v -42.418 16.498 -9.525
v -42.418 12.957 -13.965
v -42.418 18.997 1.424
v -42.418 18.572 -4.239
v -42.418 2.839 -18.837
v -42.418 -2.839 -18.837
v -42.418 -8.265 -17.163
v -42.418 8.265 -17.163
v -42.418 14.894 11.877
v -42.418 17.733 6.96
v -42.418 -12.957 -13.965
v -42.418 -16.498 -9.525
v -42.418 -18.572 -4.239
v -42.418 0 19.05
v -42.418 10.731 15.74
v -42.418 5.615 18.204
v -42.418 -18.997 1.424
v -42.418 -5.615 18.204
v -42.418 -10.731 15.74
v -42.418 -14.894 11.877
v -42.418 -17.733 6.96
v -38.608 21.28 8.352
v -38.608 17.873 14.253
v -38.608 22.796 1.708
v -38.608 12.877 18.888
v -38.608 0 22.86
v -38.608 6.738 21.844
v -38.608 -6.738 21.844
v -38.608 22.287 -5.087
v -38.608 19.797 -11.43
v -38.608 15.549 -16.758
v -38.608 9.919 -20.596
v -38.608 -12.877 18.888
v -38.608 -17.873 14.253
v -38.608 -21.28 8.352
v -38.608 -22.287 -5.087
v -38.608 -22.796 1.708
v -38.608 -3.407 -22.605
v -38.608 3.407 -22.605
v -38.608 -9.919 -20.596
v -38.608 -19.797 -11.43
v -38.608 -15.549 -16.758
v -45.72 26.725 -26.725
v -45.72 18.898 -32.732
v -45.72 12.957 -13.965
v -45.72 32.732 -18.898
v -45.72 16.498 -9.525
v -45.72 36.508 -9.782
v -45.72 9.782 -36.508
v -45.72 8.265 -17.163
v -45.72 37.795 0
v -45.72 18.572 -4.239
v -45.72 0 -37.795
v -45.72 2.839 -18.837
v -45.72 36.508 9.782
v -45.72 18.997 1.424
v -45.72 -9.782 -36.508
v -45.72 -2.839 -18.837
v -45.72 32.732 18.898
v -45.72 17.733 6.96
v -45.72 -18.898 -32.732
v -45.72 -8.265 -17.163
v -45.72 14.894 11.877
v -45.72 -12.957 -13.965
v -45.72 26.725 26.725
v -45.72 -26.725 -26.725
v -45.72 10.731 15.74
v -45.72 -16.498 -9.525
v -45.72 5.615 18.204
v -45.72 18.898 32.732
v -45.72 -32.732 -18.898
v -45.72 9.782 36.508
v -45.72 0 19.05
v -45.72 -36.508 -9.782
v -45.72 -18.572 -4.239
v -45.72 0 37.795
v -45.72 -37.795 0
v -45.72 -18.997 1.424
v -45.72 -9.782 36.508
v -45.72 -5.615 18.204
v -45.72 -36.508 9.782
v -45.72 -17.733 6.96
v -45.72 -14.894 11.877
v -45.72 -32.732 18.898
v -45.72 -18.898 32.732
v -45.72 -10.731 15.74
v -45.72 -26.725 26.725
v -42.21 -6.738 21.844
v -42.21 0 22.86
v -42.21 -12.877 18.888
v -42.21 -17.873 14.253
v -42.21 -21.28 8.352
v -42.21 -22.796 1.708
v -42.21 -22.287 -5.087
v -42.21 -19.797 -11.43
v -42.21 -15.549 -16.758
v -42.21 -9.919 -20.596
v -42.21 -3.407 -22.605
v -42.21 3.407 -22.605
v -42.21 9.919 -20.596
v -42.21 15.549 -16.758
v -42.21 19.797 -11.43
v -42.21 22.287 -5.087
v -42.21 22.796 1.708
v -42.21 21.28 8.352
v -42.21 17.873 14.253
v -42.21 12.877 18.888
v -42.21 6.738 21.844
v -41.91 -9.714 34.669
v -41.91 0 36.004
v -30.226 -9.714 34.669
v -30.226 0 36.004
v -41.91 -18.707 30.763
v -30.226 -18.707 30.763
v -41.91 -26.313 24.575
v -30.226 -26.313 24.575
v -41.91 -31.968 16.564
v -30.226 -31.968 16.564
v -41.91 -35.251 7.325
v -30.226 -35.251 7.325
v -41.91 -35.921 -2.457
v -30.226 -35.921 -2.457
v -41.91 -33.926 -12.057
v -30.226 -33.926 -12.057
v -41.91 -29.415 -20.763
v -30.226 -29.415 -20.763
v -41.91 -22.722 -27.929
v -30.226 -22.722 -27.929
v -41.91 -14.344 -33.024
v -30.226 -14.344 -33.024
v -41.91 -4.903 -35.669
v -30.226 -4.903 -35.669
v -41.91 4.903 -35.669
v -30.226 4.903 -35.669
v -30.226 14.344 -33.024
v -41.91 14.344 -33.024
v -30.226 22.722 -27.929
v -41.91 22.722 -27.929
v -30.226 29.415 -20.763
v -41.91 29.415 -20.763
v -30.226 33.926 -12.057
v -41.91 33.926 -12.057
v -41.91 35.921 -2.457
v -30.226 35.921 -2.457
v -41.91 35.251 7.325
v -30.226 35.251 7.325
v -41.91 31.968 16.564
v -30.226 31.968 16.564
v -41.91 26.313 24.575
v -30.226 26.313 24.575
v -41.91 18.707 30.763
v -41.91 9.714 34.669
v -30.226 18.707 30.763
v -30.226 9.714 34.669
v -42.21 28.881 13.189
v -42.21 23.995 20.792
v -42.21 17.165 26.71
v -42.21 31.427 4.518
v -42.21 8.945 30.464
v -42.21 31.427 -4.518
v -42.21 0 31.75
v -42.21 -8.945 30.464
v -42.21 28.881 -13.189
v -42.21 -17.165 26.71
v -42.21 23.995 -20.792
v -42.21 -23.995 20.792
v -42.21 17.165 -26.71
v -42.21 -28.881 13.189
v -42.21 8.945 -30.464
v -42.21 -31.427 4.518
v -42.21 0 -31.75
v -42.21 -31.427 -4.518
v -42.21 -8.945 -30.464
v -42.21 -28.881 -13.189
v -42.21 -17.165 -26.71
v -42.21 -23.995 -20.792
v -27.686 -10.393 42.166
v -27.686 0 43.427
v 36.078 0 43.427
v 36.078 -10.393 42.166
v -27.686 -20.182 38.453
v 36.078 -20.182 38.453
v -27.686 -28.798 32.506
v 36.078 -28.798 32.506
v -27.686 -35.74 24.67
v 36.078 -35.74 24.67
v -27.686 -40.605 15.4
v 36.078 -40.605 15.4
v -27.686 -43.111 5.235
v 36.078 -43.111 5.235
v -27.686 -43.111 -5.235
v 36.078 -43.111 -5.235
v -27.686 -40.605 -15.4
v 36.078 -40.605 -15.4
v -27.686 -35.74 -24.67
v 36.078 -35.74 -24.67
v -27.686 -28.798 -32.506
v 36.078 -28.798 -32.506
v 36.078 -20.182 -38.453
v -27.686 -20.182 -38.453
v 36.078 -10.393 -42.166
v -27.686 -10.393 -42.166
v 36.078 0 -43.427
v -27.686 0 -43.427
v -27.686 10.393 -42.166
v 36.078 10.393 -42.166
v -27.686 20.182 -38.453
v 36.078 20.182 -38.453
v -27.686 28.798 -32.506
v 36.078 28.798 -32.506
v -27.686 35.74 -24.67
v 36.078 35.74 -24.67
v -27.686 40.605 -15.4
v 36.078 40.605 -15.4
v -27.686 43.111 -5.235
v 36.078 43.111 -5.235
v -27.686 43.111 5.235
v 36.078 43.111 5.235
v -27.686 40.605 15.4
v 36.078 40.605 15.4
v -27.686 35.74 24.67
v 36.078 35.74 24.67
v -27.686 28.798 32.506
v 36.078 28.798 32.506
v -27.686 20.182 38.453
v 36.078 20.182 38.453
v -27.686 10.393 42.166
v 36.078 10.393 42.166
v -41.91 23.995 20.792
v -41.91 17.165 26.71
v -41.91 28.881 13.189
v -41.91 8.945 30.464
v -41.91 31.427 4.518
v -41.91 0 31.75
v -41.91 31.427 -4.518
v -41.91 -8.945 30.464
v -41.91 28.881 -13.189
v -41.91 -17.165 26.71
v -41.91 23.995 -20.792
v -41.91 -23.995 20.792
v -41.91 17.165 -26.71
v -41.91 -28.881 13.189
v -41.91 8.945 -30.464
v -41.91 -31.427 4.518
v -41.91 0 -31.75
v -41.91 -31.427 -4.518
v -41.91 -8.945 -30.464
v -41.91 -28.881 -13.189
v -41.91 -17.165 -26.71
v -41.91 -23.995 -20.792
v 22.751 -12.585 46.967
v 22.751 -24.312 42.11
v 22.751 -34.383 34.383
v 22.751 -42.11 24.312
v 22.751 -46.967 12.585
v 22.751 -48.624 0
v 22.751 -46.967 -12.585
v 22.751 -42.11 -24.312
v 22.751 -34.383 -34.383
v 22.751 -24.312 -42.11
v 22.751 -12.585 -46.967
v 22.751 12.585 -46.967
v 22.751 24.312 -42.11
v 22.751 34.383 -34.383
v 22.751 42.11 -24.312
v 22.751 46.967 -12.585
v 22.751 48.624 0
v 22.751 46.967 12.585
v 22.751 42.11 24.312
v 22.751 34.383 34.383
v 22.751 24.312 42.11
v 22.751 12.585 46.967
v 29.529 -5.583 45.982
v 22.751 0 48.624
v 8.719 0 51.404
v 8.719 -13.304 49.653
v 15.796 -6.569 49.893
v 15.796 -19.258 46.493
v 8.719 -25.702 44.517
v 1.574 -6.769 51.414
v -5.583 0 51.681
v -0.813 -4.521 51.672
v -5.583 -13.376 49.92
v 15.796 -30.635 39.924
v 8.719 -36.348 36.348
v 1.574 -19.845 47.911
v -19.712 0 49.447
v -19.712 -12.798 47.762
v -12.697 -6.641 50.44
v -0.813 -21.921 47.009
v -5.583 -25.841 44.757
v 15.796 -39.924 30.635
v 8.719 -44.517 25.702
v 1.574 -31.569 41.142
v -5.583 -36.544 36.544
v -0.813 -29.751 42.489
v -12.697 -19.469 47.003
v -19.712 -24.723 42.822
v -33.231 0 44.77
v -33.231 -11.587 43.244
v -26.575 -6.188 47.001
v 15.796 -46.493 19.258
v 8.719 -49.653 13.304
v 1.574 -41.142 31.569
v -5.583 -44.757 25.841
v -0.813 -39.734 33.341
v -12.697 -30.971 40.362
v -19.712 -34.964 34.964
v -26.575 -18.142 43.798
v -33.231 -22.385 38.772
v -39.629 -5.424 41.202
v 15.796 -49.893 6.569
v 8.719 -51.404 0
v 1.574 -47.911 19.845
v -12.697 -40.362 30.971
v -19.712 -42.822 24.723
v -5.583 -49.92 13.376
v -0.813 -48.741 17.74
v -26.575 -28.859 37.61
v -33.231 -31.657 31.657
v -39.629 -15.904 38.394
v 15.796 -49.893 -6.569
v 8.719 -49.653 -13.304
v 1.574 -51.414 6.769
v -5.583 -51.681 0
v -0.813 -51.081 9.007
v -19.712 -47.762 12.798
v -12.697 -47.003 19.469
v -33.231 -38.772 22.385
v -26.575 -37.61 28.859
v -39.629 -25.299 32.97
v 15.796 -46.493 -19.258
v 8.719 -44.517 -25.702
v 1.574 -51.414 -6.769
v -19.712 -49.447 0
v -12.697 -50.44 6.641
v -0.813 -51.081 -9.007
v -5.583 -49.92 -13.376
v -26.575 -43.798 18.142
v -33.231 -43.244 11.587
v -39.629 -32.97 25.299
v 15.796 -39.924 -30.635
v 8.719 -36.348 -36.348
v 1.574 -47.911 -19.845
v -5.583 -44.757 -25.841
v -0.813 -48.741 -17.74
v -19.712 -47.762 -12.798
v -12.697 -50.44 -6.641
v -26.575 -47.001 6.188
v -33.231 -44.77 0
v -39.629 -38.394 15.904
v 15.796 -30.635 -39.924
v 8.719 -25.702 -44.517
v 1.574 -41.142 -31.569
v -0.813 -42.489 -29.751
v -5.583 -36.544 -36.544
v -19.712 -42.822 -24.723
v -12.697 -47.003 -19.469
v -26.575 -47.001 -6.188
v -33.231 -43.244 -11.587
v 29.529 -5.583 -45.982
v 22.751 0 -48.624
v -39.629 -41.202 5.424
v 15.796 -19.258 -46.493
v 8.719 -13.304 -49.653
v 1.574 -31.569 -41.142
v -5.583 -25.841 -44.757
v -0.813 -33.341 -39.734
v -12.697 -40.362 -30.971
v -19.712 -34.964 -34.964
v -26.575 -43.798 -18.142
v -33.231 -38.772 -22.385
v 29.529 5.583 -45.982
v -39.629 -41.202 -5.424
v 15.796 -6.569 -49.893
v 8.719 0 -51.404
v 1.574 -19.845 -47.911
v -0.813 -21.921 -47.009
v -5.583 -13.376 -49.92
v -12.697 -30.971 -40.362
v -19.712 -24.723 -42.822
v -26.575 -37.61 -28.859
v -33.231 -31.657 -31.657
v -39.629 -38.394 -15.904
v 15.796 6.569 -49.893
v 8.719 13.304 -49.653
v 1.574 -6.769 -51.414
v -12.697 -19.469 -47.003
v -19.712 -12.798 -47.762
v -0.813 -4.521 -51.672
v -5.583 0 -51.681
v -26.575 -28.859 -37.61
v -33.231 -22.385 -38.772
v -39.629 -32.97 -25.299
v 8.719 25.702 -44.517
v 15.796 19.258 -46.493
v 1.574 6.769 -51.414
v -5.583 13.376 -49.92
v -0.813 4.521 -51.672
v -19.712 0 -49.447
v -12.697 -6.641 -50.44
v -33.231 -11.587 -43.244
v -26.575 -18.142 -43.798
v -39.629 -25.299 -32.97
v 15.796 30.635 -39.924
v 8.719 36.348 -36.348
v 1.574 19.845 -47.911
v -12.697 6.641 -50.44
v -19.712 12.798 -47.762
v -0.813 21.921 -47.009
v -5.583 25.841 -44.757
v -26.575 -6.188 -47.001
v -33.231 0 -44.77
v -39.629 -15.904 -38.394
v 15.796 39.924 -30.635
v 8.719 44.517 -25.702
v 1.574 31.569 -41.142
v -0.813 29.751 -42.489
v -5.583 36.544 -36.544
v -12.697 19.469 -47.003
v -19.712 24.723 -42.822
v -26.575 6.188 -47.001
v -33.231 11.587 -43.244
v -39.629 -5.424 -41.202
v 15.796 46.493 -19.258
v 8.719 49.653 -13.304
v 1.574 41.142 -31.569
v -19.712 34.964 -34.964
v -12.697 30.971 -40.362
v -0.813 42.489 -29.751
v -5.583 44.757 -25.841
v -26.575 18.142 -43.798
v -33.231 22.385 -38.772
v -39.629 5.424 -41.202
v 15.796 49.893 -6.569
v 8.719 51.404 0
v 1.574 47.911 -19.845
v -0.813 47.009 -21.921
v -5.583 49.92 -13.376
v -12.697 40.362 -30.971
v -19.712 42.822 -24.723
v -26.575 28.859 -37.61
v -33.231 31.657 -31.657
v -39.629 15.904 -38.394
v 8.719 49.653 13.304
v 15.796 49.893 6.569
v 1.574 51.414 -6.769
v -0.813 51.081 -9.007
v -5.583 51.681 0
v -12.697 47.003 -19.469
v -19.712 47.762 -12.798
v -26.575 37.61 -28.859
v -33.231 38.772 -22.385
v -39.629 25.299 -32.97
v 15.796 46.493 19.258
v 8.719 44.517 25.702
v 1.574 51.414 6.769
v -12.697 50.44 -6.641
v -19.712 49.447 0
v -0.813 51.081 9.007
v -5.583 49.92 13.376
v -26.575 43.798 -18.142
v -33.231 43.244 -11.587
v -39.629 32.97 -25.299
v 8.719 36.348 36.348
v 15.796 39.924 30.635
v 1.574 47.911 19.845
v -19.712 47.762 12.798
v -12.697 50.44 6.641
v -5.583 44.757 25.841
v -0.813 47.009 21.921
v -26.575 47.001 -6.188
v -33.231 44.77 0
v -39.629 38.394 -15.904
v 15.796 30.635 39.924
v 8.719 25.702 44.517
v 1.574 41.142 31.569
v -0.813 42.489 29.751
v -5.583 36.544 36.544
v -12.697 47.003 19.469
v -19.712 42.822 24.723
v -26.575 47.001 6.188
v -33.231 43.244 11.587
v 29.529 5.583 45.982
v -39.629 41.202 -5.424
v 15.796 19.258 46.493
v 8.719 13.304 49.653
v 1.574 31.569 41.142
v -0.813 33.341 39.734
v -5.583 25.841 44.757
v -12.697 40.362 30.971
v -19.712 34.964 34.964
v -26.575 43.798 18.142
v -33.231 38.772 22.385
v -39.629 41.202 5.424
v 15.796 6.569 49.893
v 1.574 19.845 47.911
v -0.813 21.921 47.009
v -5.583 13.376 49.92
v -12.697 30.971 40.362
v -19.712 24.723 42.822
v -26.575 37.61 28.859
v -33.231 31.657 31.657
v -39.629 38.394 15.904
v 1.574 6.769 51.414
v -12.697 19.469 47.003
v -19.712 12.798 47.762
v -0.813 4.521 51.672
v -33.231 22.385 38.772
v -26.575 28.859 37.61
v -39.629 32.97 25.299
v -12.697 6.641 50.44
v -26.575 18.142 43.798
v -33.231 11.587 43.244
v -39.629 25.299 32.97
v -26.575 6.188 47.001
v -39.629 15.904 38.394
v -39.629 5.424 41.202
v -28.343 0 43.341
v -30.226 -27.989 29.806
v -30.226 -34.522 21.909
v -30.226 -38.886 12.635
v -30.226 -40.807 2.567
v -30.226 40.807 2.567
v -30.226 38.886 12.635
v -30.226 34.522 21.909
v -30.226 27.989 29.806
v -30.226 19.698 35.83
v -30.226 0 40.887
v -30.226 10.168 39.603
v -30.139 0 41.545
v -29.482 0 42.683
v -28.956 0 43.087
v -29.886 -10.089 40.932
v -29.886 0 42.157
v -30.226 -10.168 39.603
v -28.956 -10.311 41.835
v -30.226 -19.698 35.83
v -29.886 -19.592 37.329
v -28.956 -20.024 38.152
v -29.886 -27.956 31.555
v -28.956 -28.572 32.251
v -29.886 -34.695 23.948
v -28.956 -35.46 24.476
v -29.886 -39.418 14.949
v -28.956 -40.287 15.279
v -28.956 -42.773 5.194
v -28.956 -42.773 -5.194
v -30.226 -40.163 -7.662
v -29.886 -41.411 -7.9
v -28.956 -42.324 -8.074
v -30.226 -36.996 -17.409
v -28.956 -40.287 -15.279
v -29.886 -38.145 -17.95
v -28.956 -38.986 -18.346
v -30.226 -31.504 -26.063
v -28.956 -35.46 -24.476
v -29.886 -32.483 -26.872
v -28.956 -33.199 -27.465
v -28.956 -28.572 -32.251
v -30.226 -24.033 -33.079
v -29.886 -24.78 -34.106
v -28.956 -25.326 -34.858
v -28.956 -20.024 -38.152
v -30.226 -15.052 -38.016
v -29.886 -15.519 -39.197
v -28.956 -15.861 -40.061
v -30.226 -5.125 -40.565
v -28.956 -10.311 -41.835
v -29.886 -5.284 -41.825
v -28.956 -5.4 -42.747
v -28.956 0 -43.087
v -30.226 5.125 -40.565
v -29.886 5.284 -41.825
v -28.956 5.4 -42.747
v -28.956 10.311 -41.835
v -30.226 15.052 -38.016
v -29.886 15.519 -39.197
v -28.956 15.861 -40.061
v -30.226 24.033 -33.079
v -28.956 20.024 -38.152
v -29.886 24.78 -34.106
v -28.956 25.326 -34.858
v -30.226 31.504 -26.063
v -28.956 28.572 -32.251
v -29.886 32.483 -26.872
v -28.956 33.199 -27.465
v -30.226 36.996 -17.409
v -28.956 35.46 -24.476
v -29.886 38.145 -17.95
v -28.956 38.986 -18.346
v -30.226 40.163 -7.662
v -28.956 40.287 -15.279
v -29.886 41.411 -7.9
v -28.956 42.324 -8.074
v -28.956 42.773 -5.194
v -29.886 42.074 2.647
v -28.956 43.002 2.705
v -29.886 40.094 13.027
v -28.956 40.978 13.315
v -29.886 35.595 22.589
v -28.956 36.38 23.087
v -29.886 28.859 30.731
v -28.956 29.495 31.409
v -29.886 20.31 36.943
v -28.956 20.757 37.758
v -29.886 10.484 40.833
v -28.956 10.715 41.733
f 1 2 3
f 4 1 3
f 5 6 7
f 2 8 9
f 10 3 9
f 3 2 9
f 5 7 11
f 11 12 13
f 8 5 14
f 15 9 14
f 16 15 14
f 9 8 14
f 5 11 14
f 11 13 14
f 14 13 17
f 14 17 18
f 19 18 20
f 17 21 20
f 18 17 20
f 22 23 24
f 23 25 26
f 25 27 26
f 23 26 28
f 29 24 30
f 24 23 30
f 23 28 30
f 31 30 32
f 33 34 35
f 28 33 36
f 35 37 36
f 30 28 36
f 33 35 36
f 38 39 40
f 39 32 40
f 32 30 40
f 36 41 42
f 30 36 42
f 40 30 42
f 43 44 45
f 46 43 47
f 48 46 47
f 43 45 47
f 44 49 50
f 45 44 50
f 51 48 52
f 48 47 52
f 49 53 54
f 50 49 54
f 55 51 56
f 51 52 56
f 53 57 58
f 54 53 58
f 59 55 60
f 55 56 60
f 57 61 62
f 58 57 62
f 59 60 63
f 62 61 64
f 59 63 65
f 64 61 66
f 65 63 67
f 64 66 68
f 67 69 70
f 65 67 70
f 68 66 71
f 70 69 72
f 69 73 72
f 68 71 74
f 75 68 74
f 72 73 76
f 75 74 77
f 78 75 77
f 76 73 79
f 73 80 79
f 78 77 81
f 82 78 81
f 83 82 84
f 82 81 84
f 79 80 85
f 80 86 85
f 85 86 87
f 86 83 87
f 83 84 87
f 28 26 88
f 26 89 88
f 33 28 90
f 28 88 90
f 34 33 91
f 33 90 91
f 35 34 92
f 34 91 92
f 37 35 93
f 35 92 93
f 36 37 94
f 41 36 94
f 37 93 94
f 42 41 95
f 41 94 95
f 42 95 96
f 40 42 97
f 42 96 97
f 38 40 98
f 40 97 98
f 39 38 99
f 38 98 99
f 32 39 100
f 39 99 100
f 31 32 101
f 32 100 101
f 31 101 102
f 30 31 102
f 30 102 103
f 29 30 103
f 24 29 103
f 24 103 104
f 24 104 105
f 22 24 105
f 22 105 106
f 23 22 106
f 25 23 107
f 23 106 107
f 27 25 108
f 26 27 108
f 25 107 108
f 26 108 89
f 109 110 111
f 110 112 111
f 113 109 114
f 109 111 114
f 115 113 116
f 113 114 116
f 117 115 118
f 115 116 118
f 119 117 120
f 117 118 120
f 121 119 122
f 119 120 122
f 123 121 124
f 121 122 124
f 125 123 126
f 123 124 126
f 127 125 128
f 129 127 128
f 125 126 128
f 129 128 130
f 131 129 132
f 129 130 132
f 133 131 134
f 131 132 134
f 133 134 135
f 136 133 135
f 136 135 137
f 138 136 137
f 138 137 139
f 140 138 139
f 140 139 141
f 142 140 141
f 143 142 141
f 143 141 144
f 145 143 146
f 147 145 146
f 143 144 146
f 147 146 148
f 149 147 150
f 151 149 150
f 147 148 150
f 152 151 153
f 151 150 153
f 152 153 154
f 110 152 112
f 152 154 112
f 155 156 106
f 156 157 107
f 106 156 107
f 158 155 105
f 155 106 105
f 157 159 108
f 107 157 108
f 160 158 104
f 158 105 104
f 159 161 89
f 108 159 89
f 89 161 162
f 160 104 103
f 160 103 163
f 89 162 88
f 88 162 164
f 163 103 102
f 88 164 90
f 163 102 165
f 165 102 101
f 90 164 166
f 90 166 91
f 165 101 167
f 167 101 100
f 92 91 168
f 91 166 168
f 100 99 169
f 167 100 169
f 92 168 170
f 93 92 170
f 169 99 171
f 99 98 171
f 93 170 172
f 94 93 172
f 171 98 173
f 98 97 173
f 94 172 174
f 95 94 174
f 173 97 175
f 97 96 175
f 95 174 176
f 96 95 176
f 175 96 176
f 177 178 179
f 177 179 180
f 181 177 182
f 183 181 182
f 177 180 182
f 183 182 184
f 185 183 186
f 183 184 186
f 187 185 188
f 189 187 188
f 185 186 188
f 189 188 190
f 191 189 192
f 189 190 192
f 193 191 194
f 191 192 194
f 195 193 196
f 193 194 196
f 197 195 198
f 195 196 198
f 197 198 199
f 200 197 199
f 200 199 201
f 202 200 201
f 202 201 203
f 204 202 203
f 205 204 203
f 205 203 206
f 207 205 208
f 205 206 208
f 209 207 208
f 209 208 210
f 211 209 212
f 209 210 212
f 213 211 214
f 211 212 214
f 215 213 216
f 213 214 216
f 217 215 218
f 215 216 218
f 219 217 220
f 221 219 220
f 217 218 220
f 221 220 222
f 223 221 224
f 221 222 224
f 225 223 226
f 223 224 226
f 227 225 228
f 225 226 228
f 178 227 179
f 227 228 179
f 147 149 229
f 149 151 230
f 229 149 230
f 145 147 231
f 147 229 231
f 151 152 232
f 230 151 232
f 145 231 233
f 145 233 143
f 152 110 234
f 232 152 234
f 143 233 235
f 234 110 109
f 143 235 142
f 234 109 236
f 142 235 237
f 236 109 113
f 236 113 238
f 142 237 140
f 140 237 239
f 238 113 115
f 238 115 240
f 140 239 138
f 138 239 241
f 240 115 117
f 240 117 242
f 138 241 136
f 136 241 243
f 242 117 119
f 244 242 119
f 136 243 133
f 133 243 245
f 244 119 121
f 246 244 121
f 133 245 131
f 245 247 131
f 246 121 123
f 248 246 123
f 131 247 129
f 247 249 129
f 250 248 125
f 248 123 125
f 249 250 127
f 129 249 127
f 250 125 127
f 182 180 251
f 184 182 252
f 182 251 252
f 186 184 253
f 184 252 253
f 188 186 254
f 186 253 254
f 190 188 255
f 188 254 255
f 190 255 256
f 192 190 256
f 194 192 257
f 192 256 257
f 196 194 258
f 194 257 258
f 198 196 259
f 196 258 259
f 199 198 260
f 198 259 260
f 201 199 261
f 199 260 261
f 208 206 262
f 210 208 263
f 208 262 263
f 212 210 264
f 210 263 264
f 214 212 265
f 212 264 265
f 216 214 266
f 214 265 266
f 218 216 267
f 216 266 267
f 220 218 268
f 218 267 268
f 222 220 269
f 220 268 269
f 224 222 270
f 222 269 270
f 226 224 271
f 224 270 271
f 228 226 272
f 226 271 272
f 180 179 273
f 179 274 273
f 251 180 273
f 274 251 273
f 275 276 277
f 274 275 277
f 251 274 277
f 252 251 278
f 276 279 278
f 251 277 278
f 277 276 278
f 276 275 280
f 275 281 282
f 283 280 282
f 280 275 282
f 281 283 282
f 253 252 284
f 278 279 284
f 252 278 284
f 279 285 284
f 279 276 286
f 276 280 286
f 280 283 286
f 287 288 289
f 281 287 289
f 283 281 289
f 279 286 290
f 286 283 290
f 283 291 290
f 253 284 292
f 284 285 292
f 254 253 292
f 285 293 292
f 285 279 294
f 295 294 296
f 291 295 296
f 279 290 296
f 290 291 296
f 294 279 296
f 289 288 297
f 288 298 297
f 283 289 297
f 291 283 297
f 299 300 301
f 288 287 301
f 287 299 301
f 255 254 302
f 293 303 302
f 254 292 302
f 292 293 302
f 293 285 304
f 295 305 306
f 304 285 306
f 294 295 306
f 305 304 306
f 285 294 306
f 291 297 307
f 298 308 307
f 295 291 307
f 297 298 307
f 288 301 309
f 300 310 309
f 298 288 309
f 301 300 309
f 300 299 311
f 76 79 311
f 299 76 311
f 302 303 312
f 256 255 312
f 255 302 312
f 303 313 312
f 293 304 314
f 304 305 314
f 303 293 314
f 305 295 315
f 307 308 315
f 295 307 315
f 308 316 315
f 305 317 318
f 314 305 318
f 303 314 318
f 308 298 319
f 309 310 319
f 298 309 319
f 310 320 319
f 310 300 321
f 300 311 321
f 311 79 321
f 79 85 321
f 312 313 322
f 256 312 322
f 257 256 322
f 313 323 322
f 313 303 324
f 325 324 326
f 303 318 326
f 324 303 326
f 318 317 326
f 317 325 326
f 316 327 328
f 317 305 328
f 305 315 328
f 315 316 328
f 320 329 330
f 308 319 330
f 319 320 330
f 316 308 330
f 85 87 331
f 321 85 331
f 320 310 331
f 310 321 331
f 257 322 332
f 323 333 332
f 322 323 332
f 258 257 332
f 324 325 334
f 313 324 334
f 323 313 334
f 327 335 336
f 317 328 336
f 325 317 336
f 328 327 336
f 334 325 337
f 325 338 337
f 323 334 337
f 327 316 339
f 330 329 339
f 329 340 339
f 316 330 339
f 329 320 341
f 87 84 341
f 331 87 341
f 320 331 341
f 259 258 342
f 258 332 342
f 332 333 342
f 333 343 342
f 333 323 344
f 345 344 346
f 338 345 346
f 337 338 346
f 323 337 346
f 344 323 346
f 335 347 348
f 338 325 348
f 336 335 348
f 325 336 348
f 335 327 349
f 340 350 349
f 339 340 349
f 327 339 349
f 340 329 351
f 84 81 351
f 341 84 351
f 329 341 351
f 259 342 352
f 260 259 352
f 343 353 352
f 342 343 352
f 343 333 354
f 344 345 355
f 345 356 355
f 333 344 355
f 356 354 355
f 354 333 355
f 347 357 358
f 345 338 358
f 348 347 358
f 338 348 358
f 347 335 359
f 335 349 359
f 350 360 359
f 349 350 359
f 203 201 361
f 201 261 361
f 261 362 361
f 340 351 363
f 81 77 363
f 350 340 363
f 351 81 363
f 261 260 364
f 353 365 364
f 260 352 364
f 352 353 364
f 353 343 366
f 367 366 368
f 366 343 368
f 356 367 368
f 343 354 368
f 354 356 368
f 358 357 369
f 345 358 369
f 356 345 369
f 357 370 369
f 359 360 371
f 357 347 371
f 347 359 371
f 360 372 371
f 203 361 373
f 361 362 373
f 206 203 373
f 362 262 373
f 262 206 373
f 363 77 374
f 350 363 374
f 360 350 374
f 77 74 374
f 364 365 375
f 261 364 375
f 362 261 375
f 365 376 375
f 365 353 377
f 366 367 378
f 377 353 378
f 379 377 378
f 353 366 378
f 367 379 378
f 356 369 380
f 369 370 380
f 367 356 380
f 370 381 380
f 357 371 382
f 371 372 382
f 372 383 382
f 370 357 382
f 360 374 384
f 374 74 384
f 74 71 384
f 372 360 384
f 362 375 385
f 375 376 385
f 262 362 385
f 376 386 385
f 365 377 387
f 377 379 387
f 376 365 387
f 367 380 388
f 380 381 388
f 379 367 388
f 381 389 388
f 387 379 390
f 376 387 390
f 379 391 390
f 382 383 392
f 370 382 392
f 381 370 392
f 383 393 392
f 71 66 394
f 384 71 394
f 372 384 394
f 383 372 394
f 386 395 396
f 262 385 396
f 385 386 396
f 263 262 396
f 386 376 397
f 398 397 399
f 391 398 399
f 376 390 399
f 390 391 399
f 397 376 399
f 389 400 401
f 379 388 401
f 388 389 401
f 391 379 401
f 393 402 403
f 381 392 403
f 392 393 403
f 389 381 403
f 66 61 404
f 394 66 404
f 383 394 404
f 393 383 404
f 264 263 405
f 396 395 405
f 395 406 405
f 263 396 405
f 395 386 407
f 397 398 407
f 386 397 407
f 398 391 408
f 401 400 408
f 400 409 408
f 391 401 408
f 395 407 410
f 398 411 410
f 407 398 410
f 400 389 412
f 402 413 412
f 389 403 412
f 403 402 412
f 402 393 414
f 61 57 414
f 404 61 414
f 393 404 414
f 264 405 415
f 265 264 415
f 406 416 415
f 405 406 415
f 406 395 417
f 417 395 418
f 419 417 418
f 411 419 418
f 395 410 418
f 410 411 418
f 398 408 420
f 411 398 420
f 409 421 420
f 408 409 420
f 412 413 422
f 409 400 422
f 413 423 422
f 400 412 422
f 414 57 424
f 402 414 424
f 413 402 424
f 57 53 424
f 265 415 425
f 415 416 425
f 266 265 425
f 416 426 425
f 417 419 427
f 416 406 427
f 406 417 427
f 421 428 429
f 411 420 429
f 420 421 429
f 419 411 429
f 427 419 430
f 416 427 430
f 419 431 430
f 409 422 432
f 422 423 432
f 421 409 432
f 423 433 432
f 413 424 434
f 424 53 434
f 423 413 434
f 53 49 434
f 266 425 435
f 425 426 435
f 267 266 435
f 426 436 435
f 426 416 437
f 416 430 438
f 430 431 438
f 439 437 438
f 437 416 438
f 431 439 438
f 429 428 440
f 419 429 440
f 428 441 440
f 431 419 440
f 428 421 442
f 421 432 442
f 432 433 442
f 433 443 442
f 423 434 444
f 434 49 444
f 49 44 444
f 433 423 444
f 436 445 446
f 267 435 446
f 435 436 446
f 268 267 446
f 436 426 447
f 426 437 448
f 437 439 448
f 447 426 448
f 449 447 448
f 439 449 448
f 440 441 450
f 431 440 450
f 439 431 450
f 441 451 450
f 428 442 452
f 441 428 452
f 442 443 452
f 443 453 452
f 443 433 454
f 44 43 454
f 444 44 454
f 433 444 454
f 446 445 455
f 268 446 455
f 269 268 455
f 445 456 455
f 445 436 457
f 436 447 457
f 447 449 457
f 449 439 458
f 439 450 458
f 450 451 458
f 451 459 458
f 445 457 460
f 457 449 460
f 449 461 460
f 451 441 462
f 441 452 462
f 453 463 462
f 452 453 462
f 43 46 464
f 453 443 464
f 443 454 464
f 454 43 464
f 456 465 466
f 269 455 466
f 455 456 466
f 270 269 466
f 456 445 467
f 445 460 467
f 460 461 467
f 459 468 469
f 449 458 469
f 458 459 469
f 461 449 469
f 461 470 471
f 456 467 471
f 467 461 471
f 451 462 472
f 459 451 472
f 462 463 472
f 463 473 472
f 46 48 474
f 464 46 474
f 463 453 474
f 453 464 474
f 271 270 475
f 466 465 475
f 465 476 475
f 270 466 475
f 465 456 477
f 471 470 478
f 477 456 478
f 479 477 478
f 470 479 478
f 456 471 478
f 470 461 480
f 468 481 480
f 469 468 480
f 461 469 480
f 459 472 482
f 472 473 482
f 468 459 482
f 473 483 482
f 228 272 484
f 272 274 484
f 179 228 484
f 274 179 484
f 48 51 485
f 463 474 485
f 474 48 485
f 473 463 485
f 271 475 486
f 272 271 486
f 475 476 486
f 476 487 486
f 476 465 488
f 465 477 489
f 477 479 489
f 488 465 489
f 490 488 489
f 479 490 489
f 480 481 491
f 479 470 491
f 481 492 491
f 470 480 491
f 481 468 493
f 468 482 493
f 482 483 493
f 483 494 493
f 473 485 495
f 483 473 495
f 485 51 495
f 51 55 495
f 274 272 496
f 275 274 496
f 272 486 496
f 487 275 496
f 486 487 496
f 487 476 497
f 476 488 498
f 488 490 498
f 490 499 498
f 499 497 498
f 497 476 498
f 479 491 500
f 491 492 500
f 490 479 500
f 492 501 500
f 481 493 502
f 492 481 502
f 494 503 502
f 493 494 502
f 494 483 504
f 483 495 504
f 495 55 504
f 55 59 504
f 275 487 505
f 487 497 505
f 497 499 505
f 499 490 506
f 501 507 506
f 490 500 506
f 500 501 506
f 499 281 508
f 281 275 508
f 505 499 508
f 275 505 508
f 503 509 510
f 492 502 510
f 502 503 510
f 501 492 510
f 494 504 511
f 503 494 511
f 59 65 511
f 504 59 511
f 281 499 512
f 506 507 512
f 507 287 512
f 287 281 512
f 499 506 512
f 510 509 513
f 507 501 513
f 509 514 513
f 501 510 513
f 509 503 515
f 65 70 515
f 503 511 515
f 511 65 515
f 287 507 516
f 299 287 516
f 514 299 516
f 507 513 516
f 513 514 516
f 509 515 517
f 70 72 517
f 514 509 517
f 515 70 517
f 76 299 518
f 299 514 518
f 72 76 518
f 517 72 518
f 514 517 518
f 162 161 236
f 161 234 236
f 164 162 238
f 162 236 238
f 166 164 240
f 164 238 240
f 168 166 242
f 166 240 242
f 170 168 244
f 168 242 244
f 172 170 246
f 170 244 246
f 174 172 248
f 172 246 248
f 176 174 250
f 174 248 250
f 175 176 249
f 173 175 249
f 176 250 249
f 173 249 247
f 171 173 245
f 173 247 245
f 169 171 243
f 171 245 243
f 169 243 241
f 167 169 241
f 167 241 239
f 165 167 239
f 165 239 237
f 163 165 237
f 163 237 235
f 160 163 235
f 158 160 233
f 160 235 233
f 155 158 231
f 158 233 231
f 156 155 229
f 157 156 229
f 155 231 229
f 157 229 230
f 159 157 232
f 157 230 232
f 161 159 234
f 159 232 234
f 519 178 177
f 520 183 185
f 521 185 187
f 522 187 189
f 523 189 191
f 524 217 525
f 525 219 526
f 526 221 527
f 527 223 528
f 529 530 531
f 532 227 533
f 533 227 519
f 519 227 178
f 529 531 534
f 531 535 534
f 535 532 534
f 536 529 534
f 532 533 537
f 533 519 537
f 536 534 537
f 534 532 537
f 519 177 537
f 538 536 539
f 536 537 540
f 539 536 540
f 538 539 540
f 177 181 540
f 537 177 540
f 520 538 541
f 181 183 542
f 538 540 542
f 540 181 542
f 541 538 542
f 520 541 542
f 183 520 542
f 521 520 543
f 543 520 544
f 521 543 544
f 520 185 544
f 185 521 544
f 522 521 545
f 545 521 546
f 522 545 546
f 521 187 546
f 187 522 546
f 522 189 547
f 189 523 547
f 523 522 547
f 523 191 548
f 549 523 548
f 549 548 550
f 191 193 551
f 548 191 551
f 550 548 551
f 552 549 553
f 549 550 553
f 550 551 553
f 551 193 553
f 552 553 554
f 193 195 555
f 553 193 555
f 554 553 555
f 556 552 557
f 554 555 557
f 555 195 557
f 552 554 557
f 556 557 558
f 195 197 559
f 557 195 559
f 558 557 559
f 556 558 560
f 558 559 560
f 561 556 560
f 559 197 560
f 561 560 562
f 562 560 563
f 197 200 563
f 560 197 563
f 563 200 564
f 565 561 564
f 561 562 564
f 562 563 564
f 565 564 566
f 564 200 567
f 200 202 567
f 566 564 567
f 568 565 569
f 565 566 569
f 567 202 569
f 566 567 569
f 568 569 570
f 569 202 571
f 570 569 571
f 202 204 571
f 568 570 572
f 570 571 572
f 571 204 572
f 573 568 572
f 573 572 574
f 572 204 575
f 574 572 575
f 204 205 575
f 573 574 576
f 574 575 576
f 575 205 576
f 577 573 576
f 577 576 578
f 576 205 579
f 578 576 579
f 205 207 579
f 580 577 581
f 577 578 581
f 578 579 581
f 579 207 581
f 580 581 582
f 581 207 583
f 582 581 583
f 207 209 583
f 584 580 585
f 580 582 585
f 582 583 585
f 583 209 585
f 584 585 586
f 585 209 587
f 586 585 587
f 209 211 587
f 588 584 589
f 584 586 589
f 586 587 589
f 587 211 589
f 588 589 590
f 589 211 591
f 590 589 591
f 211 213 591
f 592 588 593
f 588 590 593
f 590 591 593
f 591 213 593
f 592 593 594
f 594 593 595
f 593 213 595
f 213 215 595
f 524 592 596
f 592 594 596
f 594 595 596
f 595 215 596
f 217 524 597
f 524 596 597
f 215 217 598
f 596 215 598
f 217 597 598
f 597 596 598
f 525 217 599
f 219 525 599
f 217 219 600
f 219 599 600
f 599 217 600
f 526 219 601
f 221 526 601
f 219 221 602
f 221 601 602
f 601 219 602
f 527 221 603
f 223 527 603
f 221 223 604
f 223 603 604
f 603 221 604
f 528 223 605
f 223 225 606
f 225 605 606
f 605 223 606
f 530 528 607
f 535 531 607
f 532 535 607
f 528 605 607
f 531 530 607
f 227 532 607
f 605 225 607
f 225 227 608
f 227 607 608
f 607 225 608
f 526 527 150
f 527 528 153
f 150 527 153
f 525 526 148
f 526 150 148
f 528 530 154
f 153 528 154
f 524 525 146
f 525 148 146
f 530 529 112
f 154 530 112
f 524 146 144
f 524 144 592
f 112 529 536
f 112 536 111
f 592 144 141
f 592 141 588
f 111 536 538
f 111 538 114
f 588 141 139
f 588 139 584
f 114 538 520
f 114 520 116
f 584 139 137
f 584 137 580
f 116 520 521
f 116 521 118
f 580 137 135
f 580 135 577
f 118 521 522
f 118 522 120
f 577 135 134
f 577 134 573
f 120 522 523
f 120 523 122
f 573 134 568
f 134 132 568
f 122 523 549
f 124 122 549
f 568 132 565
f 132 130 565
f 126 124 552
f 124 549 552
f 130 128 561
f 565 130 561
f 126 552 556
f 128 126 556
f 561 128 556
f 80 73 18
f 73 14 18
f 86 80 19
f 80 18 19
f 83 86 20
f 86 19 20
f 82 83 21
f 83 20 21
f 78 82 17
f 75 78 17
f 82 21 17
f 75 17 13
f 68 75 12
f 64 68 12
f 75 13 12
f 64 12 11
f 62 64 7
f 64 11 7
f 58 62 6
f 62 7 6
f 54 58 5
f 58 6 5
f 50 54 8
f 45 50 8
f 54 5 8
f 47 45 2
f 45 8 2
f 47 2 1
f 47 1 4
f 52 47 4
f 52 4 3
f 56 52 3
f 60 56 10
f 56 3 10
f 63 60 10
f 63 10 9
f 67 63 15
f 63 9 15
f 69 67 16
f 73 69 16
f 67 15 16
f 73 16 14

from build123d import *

# Parameters (mm, degrees)
FILLET1_R = 2.54


with BuildPart() as part:
    # Sketch1 → Revolve1 (revolve)
    with BuildSketch(Plane.XY, mode=Mode.PRIVATE) as revolve1_sk:
        with BuildLine():
            Line((-38.608, 0), (-38.608, 22.86))
            Line((-38.608, 22.86), (-41.91, 22.86))
            Line((-41.91, 22.86), (-42.21, 22.86))
            Line((-42.21, 22.86), (-42.21, 31.75))
            Line((-42.21, 31.75), (-41.91, 31.75))
            Line((-41.91, 31.75), (-41.91, 36.0045))
            Line((-41.91, 36.0045), (-30.226, 36.0045))
            Line((-30.226, 36.0045), (-30.226, 43.427437066))
            Line((-30.226, 43.427437066), (36.078077203, 43.427437066))
            ThreePointArc((36.078077203, 43.427437066), (-5.583158711, 51.681323799), (-45.72, 37.795388634))
            Line((-45.72, 37.795388634), (-45.72, 19.05))
            Line((-45.72, 19.05), (-42.418, 19.05))
            Line((-42.418, 19.05), (-42.418, 0))
            Line((-42.418, 0), (-38.608, 0))
        make_face()
    revolve(revolve1_sk.sketch.rotate(Axis((-42.418, 0, 0), (1, 0, 0)), 90), axis=Axis((-42.418, 0, 0), (1, 0, 0)))

    # Fillet1
    fillet1_edges = [part.edges().sort_by_distance(p)[0] for p in [
        (-30.226, 0, -43.427437066),
    ]]
    fillet(fillet1_edges, radius=FILLET1_R)


solid = part.part
